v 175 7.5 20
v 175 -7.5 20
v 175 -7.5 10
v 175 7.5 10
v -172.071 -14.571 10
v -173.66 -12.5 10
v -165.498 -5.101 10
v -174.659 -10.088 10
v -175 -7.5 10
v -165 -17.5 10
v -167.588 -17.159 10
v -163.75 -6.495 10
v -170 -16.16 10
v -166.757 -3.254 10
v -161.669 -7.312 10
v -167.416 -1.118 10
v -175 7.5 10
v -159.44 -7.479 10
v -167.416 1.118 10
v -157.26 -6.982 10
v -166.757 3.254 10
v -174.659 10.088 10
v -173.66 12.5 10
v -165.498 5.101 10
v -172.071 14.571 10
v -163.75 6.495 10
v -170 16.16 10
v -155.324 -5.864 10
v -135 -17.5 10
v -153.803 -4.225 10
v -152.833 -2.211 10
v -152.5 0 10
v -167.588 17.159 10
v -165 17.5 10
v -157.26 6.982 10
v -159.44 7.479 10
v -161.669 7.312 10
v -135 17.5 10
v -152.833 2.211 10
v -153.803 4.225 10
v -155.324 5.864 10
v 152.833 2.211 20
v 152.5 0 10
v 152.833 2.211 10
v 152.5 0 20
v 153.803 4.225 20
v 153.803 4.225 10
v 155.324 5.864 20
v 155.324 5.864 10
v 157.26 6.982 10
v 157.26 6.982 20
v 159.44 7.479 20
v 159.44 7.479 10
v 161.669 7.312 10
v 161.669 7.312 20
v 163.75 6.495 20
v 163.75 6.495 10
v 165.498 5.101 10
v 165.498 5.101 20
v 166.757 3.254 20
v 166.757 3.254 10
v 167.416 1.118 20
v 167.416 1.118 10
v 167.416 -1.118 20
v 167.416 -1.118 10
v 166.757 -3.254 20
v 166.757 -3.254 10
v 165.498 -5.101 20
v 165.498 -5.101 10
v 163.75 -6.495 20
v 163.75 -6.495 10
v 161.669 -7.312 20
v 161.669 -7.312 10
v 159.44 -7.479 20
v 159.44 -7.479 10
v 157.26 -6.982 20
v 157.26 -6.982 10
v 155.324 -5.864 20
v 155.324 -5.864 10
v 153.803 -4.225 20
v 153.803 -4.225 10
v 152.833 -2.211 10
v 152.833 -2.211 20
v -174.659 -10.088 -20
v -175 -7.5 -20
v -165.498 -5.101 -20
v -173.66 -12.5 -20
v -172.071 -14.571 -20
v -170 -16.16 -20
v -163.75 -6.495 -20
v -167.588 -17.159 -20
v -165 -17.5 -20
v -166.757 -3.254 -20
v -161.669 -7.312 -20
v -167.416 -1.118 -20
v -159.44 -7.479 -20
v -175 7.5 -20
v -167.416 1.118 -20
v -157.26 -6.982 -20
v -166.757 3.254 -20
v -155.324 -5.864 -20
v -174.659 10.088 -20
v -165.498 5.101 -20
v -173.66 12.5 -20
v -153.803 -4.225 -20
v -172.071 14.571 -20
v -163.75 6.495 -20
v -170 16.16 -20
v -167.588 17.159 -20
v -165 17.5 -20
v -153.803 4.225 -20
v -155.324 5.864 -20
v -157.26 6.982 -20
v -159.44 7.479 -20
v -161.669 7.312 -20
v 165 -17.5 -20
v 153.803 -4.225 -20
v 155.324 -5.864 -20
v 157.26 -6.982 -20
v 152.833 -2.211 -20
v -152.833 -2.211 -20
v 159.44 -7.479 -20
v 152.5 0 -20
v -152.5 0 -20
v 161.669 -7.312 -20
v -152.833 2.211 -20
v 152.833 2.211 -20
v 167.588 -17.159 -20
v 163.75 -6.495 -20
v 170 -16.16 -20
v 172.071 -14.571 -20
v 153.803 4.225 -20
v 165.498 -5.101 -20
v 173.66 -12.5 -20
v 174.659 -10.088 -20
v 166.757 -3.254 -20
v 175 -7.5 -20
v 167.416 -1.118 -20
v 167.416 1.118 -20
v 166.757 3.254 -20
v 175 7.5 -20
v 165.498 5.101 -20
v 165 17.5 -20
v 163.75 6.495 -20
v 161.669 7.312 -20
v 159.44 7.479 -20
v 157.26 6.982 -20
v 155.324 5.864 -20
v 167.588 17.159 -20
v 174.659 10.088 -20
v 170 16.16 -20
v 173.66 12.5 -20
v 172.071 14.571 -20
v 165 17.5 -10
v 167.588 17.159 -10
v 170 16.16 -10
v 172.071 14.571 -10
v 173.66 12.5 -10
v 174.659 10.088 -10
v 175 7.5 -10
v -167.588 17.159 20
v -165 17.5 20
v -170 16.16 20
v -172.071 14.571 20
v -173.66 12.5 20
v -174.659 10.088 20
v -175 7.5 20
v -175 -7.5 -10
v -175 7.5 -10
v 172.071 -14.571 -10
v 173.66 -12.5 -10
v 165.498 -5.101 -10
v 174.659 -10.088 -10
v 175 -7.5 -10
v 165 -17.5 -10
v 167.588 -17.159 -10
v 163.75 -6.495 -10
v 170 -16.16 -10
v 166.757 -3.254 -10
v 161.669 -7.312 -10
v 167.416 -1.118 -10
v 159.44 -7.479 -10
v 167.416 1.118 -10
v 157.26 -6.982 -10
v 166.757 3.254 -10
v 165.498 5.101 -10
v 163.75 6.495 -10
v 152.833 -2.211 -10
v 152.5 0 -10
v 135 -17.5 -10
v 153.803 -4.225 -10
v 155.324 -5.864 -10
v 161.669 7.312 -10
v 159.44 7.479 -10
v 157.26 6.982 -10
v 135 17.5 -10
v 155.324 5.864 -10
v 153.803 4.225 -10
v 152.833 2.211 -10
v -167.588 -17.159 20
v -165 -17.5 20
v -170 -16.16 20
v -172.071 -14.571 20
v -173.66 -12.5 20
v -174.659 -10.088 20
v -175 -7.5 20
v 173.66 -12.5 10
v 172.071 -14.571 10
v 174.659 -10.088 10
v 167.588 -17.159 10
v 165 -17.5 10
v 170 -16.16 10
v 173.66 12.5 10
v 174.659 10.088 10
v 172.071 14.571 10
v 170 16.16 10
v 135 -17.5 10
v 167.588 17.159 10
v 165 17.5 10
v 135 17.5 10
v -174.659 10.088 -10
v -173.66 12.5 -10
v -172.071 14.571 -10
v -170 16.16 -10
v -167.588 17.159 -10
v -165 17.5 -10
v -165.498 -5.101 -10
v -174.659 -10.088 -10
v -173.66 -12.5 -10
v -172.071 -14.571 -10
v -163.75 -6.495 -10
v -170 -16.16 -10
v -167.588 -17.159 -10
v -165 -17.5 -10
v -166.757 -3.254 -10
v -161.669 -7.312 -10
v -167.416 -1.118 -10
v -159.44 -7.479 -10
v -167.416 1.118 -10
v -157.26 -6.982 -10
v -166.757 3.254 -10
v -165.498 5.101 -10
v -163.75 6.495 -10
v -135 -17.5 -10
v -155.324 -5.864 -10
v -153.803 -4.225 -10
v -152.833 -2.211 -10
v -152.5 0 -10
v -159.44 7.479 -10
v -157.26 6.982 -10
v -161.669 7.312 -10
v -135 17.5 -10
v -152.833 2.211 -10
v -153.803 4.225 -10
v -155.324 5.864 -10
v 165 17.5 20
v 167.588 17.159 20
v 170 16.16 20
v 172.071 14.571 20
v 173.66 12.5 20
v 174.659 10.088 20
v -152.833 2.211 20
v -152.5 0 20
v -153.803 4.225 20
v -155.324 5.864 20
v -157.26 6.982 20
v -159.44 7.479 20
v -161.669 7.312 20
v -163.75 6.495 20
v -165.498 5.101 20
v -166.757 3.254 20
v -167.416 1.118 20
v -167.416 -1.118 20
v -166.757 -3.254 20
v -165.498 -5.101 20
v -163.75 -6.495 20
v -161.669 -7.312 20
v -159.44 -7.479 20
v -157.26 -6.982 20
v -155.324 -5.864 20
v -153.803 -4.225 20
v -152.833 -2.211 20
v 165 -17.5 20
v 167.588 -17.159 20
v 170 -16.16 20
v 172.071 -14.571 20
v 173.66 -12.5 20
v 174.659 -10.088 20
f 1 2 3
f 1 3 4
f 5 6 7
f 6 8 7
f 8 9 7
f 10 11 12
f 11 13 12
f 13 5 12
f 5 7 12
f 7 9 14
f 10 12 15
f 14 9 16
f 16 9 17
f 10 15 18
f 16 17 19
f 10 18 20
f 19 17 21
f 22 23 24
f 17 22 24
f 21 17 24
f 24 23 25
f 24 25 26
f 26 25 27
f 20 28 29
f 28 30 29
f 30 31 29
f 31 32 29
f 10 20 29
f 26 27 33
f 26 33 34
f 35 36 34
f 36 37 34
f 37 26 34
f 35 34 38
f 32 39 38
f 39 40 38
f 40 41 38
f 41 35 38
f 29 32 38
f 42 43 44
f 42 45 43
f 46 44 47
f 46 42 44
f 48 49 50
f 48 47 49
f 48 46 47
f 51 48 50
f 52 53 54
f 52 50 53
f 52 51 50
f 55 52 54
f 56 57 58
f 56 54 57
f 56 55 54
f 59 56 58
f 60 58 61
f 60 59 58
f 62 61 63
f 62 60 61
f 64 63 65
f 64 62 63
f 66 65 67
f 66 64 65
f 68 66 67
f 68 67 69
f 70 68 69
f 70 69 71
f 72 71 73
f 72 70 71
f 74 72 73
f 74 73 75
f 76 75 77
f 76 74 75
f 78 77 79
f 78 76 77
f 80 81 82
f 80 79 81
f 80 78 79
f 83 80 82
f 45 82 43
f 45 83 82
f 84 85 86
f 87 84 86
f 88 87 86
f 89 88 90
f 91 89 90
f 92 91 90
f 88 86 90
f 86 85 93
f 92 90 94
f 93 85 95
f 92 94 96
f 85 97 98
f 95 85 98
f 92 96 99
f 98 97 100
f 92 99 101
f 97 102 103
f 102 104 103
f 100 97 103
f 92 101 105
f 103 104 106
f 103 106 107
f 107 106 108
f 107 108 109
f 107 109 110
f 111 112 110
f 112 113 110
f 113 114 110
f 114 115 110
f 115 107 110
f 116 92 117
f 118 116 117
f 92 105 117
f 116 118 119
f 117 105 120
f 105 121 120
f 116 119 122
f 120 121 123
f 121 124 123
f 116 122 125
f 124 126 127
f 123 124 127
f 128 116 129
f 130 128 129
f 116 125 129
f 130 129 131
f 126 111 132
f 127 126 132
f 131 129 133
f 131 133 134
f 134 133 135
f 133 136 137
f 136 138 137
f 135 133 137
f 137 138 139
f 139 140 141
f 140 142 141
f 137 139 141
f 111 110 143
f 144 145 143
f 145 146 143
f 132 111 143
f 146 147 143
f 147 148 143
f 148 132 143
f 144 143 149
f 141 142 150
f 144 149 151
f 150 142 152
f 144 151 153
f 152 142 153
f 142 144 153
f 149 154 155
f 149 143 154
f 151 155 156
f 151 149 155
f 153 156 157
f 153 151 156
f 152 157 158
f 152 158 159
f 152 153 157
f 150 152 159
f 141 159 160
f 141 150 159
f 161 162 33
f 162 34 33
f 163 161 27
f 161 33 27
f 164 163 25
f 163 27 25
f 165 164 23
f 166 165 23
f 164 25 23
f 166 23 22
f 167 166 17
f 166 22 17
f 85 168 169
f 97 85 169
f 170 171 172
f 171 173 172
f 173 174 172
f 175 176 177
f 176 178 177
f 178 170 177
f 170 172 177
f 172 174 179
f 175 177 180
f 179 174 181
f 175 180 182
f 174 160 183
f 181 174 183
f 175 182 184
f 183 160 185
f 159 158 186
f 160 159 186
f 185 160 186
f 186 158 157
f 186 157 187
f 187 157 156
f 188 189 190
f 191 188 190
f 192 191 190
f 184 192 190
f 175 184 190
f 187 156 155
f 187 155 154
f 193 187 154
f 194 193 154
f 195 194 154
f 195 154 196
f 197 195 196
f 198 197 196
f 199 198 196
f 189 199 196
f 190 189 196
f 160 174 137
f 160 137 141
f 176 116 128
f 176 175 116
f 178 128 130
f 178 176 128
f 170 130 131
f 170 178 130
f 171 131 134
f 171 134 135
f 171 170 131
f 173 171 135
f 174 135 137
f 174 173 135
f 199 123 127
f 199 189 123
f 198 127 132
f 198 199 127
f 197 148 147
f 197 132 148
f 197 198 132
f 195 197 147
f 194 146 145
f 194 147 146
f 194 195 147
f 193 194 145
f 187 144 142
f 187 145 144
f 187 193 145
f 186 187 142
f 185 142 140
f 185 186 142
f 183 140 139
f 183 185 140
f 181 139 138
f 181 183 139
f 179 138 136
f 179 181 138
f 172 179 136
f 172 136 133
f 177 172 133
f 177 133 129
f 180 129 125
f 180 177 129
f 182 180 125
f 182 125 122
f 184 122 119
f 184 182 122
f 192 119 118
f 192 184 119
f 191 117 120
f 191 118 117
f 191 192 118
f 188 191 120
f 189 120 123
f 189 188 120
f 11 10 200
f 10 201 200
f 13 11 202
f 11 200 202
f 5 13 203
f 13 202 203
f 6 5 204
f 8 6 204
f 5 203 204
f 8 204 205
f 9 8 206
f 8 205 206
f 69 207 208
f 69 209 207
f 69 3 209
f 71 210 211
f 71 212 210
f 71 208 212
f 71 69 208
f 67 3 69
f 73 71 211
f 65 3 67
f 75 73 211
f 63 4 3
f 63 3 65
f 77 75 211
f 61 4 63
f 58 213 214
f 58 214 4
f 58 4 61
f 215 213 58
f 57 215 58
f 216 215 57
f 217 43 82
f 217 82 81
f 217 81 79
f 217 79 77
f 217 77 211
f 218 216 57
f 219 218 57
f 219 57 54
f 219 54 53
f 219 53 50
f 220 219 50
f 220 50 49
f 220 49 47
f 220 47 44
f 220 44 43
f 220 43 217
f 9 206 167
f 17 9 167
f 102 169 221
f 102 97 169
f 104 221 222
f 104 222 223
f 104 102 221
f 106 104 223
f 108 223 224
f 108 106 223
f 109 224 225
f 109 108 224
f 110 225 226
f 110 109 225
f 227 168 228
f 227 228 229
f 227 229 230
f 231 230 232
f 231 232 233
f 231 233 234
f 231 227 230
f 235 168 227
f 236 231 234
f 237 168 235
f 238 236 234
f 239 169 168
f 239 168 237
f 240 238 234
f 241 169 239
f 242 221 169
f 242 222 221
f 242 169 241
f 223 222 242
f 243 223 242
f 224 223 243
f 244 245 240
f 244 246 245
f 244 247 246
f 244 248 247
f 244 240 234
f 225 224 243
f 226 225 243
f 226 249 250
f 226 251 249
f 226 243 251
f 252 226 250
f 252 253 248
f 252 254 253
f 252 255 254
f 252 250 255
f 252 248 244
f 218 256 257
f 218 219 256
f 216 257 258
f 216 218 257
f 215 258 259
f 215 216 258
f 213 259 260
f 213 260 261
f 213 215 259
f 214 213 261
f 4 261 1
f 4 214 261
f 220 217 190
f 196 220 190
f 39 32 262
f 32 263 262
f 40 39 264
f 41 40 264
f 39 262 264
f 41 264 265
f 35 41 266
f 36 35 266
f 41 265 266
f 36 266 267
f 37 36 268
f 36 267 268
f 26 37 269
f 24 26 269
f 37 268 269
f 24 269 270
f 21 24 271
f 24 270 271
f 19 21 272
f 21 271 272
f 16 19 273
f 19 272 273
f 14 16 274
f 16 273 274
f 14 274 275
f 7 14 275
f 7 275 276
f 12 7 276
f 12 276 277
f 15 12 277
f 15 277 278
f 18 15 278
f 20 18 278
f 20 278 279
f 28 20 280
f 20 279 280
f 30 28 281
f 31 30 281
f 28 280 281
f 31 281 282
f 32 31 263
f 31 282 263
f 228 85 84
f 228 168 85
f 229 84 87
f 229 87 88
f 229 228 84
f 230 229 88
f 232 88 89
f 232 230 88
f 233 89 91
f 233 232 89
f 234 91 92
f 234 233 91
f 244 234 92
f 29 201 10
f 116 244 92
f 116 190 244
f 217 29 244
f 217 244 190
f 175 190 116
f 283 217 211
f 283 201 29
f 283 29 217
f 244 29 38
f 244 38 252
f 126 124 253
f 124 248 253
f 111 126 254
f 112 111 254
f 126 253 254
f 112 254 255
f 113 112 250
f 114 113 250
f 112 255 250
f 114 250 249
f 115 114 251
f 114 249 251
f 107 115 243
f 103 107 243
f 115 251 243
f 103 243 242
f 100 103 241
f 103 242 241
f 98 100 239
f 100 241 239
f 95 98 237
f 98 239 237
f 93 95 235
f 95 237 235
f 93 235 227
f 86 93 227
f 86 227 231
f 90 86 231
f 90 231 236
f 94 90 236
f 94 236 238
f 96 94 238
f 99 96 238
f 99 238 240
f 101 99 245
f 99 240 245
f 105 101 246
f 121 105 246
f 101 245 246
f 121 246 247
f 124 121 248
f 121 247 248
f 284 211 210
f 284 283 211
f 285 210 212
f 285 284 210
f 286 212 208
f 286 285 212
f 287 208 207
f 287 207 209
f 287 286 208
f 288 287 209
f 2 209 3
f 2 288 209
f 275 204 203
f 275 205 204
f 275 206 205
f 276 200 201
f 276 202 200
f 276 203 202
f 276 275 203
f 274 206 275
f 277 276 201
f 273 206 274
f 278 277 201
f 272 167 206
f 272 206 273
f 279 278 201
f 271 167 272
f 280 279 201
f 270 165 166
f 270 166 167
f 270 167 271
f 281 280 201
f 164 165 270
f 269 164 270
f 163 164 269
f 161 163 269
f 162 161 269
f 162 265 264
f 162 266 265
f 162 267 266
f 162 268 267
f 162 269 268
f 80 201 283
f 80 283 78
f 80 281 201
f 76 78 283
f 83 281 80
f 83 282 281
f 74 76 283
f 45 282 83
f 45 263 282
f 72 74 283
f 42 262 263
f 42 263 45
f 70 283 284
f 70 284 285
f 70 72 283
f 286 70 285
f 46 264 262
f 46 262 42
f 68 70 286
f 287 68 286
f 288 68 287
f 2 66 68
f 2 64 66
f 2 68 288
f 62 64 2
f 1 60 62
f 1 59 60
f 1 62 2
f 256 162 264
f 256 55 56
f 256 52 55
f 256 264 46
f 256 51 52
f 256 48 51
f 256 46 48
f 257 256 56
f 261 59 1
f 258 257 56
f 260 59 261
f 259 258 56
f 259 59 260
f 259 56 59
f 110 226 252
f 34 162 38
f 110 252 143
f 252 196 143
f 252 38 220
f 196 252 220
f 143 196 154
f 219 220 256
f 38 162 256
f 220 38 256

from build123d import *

# Parameters (mm, degrees)
SKETCH1_W           = 350
SKETCH1_H           = 35
BOSS_EXTRUDE1_DEPTH = 20
SKETCH2_W           = 80
SKETCH2_H           = 20
CUT_EXTRUDE1_DEPTH  = 178.006355818
SKETCH4_R           = 7.5
CUT_EXTRUDE2_DEPTH  = 178.006355818
FILLET1_R           = 10
FILLET2_R           = 10


with BuildPart() as part:
    # Sketch1 → Boss-Extrude1 (new, symmetric)
    with BuildSketch(Plane.XY):
        Rectangle(SKETCH1_W, SKETCH1_H)
    extrude(amount=BOSS_EXTRUDE1_DEPTH, both=True)

    # Sketch2 → Cut-Extrude1 (cut, symmetric)
    with BuildSketch(Plane(origin=(0, 0, 0), x_dir=(1, 0, 0), z_dir=(0, 1, 0))):
        with Locations((-175, 0)):
            Rectangle(SKETCH2_W, SKETCH2_H)
    cut_extrude1 = extrude(amount=CUT_EXTRUDE1_DEPTH, both=True, mode=Mode.SUBTRACT)

    # Sketch4 → Cut-Extrude2 (cut, symmetric)
    with BuildSketch(Plane.XY):
        with Locations((-160, 0)):
            Circle(SKETCH4_R)
    cut_extrude2 = extrude(amount=CUT_EXTRUDE2_DEPTH, both=True, mode=Mode.SUBTRACT)

    # Fillet1
    fillet1_edges = [part.edges().sort_by_distance(p)[0] for p in [
        (-175, -17.5, -15),
        (-175, 17.5, -15),
        (-175, -17.5, 15),
        (-175, 17.5, 15),
    ]]
    fillet(fillet1_edges, radius=FILLET1_R)

    # Mirror3: Cut-Extrude1, Cut-Extrude2 across plane
    add(cut_extrude1.mirror(Plane(origin=(0, 0, 0), x_dir=(0, 0, 1), z_dir=(1, 0, 0))), mode=Mode.SUBTRACT)
    add(cut_extrude2.mirror(Plane(origin=(0, 0, 0), x_dir=(0, 0, 1), z_dir=(1, 0, 0))), mode=Mode.SUBTRACT)

    # Fillet2
    fillet2_edges = [part.edges().sort_by_distance(p)[0] for p in [
        (175, -17.5, -15),
        (175, 17.5, -15),
        (175, -17.5, 15),
        (175, 17.5, 15),
    ]]
    fillet(fillet2_edges, radius=FILLET2_R)


solid = part.part
